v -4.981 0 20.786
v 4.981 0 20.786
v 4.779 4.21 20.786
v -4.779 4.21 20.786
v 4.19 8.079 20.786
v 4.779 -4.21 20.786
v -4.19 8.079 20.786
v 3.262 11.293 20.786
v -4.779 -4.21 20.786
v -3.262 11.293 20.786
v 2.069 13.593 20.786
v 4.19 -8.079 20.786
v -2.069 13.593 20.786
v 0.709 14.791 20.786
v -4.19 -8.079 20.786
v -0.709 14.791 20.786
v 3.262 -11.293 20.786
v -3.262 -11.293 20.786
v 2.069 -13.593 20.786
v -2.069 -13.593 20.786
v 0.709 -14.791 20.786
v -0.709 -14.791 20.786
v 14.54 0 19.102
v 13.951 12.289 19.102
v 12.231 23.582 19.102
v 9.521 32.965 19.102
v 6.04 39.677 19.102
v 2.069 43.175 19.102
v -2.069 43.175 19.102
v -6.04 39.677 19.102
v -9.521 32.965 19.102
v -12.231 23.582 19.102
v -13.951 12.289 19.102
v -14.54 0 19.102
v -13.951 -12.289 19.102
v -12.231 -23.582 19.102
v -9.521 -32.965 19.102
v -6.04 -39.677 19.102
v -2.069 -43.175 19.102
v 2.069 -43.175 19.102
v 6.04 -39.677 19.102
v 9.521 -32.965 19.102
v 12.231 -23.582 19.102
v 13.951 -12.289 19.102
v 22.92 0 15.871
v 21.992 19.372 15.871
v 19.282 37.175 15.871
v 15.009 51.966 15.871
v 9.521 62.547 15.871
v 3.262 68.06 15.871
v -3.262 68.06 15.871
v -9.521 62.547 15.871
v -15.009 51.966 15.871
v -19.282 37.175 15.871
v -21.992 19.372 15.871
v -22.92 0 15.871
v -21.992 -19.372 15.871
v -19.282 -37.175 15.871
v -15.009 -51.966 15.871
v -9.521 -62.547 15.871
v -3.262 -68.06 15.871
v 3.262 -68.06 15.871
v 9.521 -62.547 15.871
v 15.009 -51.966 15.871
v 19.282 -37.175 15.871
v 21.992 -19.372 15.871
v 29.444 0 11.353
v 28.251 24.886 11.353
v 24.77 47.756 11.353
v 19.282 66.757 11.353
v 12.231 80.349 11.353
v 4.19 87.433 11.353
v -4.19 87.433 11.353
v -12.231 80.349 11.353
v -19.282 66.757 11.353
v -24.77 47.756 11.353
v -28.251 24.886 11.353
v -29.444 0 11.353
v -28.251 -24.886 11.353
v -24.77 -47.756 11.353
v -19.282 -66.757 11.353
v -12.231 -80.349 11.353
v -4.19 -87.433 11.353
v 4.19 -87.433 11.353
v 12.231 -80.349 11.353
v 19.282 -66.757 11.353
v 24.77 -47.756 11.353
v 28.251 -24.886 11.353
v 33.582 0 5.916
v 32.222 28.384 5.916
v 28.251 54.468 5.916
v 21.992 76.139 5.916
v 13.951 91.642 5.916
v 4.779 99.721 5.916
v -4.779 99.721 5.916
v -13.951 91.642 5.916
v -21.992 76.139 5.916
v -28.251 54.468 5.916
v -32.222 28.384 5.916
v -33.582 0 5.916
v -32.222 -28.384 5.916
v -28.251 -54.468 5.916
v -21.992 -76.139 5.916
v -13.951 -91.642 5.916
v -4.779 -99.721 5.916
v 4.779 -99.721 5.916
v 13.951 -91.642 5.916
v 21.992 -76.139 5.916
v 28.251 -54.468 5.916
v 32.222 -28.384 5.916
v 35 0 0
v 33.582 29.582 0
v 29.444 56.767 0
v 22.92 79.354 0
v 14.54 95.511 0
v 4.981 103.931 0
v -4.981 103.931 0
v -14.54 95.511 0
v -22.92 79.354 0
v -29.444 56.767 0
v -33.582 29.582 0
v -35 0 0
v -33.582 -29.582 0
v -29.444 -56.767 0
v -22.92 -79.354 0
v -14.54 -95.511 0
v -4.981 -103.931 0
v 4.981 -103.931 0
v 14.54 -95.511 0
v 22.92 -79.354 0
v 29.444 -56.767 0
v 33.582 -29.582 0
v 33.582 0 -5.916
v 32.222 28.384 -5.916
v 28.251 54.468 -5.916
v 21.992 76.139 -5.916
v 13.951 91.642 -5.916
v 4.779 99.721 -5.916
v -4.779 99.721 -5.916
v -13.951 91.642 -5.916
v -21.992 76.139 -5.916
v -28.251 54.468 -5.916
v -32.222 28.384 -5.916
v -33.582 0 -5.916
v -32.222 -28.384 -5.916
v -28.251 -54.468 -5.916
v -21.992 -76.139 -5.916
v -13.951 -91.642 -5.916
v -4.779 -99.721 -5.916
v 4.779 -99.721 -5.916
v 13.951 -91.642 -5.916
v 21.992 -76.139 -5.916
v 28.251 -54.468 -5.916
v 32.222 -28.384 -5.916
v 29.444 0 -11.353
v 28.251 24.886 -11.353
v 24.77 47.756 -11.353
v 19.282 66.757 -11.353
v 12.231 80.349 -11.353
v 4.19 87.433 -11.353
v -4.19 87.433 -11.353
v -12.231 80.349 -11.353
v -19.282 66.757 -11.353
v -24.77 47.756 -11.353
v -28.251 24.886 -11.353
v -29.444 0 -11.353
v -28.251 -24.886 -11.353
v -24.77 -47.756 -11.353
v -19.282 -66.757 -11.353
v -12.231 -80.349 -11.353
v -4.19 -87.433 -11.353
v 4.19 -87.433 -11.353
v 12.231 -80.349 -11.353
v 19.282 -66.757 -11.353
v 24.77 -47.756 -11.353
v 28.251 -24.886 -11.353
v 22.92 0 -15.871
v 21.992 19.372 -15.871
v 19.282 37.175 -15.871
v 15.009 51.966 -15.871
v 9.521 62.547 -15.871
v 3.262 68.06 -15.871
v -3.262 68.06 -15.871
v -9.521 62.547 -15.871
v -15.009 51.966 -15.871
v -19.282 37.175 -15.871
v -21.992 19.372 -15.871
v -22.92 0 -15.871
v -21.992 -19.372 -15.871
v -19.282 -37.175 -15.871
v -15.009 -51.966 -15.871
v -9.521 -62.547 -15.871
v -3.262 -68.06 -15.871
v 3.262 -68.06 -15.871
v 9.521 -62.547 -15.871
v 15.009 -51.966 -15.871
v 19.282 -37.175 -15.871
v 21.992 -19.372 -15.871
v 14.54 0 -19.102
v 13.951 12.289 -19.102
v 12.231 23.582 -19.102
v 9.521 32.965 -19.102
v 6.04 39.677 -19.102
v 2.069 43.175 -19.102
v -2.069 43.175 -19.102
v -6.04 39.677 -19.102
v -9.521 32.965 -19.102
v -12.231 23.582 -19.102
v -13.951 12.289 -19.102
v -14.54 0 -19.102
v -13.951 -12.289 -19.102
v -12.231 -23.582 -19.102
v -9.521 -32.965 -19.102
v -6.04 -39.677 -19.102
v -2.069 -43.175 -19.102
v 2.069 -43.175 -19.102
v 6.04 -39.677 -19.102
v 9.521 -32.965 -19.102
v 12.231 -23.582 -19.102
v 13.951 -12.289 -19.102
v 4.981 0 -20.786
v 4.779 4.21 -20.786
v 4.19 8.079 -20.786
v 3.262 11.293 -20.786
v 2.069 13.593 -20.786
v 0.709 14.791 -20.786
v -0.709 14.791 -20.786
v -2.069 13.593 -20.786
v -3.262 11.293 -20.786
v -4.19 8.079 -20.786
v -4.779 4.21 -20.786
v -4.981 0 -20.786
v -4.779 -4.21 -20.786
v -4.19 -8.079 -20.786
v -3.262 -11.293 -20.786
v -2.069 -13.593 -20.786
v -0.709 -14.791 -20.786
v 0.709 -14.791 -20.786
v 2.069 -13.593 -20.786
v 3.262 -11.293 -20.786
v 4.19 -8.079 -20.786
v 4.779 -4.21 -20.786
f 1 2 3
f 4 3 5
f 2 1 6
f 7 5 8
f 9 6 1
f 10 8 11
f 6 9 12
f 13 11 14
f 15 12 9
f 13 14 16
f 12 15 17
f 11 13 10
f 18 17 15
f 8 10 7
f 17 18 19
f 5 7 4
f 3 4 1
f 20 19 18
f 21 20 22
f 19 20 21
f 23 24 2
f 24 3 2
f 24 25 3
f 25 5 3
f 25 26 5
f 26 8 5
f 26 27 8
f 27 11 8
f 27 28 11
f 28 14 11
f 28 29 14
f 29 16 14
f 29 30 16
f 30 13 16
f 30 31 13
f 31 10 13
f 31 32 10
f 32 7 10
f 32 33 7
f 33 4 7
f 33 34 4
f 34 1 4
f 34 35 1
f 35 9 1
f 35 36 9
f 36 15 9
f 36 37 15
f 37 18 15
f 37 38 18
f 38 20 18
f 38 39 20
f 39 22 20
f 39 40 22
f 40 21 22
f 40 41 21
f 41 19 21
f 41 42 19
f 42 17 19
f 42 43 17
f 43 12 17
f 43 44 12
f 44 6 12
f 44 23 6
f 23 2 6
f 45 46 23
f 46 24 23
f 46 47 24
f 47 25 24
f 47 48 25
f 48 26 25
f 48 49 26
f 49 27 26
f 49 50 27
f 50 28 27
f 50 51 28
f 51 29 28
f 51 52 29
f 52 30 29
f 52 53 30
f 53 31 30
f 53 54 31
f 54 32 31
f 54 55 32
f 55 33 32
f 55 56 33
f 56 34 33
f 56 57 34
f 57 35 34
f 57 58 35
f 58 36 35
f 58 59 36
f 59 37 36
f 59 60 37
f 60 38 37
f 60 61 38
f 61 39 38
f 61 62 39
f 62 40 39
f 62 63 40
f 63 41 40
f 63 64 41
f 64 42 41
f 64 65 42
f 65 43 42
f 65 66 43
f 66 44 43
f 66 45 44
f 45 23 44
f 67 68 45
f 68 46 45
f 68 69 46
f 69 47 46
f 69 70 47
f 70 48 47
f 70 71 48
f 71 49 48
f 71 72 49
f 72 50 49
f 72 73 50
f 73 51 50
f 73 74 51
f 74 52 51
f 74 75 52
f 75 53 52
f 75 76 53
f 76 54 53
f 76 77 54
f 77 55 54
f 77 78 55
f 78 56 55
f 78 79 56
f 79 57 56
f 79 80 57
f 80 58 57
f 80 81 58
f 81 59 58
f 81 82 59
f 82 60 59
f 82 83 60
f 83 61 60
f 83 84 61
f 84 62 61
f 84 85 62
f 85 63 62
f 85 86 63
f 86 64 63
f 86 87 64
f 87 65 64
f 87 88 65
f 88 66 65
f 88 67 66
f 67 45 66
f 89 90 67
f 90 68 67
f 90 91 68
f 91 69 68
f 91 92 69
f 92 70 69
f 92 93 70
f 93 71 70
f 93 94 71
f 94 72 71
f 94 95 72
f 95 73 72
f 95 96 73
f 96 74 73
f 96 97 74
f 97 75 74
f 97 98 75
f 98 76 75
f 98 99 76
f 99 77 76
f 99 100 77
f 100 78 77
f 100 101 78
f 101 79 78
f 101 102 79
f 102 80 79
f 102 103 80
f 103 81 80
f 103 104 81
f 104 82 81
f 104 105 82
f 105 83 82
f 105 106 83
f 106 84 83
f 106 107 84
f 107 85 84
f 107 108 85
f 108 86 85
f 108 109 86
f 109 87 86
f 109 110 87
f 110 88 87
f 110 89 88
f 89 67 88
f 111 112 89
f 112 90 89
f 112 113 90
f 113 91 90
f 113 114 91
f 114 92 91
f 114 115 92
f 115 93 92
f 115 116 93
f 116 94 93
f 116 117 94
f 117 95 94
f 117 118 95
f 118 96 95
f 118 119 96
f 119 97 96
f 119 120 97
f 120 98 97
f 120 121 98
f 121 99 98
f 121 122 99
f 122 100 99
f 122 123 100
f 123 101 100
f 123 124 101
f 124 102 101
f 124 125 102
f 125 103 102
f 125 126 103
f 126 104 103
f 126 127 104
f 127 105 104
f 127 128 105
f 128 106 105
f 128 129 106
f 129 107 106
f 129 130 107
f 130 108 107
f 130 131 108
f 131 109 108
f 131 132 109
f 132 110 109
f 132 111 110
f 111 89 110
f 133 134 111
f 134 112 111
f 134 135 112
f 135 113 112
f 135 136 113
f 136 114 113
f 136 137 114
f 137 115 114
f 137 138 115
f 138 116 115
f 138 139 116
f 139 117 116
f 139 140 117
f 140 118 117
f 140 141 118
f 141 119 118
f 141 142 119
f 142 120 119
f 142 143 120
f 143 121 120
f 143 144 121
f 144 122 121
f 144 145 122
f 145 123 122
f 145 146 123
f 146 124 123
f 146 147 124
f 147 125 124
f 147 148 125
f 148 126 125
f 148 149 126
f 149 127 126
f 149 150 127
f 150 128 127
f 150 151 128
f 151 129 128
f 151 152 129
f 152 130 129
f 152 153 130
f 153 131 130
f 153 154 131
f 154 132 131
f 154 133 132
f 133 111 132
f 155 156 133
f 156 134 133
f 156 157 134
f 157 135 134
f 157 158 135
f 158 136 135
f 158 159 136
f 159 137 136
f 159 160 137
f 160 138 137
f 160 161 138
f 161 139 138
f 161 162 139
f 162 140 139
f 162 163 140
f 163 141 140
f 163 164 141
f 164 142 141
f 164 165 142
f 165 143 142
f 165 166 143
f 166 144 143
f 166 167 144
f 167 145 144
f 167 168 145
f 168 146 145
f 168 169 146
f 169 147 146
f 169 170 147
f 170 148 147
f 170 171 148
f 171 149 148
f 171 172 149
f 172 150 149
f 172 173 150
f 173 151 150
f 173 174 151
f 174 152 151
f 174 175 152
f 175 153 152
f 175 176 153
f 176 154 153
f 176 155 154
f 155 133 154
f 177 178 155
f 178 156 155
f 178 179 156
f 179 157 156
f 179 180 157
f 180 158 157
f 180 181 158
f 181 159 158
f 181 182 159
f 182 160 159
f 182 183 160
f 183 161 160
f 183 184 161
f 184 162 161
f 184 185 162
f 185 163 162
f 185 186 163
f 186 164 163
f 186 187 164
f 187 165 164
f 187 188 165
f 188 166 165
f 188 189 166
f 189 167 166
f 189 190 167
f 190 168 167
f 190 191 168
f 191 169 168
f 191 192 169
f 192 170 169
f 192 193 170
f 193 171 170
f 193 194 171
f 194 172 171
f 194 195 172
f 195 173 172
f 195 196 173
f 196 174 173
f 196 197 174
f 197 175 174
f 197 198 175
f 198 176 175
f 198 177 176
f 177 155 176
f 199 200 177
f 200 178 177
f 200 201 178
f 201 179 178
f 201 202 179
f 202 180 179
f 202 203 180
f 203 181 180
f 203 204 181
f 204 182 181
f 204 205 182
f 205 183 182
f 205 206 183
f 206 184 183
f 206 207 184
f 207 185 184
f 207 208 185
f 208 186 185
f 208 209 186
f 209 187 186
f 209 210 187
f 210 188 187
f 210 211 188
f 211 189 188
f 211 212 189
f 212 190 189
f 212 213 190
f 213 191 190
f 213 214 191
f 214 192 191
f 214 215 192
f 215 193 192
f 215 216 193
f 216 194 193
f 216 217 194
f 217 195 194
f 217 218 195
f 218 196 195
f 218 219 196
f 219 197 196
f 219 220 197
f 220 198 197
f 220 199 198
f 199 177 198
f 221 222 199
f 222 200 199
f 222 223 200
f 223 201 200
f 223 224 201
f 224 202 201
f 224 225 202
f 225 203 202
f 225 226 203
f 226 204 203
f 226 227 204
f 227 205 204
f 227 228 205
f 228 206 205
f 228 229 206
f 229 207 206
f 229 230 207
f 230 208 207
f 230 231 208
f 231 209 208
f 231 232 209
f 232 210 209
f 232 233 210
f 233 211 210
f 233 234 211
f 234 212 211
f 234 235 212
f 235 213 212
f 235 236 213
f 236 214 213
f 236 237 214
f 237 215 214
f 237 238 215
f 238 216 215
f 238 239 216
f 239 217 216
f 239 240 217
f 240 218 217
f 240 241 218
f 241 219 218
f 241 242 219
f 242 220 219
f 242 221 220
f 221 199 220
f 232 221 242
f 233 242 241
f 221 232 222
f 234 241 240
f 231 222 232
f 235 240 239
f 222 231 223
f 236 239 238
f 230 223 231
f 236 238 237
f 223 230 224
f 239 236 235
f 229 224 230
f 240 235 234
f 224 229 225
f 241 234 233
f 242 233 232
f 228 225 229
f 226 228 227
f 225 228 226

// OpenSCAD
// Generated by SolidPython 1.0.1 on 2020-07-29 00:46:46


scale(v = [5, 15, 3]) {
	sphere(r = 7);
}
/***********************************************
*********      SolidPython code:      **********
************************************************
 
# import packages: SolidPython
from solid import *
from solid.utils import *
from itertools import chain, combinations, permutations


class Resize:

    def __init__(self, scad_file):
        self.scad_file = scad_file
        #self.scad_file = import_scad(scad_file)
        # cone/cylinder param:
        self.r1 = 0
        self.r2 = 0
        self.h = 0
        # rectangular prism param:
        self.w = 0
        self.l = 0
        # ellipse param:
        self.r = 0

    # import OpenScad code (file name corresponds to shape)


    # classify shape + parameters
    def assign(self, param1, param2, param3):
        if self.scad_file == 'cone.scad':
            self.r1 = param1
            self.r2 = param2
            self.h = param3
        elif self.scad_file == 'cylinder.scad':
            self.r1 = param1
            self.r2 = param2
            self.h = param3
        elif self.scad_file == 'rectangularPrism.scad':
            self.h = param1
            self.l = param2
            self.w = param3
        else:
            self.r = param1
            self.h = param2

    # resize parameters
    def iterate(self):
        x = range(3, 20, 2)
        i = 1
        if self.scad_file == 'cone.scad':
            tempList = list(permutations(x, 2))
            for temp in tempList:
                param1 = temp[0]
                param2 = temp[1]
                filepath = 'produced_scad_files/' + 'cone' + str(param1) + '_' + str(param2) + '_' + '.scad'
                scad_render_to_file(cylinder(h=param1, r1=param2, r2=0), filepath)

        elif self.scad_file == 'cylinder.scad':
            tempList = list(permutations(x, 3))
            for temp in tempList:
                param1 = temp[0]
                param2 = temp[1]
                filepath = 'produced_scad_files/' + 'cylinder' + str(param1) + '_' + str(param2) + '_' + '.scad'
                scad_render_to_file(cylinder(h=param1, r1=param2, r2=param2), filepath)

        elif self.scad_file == 'rectangularPrism.scad':
            tempList = list(permutations(x, 3))
            for temp in tempList:
                param1 = temp[0]
                param2 = temp[1]
                param3 = temp[2]
                filepath = 'produced_scad_files/' + 'rectangularPrism' + str(param1) + '_' + str(param2) + '_' + str(
                    param3) + '.scad'
                scad_render_to_file(cube(size=(param1, param2, param3)), filepath)

        elif self.scad_file == 'ellipse.scad':
            tempList = list(permutations(x, 4))
            for temp in tempList:
                param1 = temp[0]
                param2 = temp[1]
                param3 = temp[2]
                param4 = temp[3]
                filepath = 'produced_scad_files/' + 'ellipse' + str(param1) + '_' + str(param2) + '_' + str(param3) + '_' + str(param4) + '.scad'
                scad_render_to_file(scale([param1, param2, param3])(sphere(r=param4)), filepath)

    def render_to_scadfile(self):
        scad_render_to_file(scad, 'example.scad') 
 
************************************************/
